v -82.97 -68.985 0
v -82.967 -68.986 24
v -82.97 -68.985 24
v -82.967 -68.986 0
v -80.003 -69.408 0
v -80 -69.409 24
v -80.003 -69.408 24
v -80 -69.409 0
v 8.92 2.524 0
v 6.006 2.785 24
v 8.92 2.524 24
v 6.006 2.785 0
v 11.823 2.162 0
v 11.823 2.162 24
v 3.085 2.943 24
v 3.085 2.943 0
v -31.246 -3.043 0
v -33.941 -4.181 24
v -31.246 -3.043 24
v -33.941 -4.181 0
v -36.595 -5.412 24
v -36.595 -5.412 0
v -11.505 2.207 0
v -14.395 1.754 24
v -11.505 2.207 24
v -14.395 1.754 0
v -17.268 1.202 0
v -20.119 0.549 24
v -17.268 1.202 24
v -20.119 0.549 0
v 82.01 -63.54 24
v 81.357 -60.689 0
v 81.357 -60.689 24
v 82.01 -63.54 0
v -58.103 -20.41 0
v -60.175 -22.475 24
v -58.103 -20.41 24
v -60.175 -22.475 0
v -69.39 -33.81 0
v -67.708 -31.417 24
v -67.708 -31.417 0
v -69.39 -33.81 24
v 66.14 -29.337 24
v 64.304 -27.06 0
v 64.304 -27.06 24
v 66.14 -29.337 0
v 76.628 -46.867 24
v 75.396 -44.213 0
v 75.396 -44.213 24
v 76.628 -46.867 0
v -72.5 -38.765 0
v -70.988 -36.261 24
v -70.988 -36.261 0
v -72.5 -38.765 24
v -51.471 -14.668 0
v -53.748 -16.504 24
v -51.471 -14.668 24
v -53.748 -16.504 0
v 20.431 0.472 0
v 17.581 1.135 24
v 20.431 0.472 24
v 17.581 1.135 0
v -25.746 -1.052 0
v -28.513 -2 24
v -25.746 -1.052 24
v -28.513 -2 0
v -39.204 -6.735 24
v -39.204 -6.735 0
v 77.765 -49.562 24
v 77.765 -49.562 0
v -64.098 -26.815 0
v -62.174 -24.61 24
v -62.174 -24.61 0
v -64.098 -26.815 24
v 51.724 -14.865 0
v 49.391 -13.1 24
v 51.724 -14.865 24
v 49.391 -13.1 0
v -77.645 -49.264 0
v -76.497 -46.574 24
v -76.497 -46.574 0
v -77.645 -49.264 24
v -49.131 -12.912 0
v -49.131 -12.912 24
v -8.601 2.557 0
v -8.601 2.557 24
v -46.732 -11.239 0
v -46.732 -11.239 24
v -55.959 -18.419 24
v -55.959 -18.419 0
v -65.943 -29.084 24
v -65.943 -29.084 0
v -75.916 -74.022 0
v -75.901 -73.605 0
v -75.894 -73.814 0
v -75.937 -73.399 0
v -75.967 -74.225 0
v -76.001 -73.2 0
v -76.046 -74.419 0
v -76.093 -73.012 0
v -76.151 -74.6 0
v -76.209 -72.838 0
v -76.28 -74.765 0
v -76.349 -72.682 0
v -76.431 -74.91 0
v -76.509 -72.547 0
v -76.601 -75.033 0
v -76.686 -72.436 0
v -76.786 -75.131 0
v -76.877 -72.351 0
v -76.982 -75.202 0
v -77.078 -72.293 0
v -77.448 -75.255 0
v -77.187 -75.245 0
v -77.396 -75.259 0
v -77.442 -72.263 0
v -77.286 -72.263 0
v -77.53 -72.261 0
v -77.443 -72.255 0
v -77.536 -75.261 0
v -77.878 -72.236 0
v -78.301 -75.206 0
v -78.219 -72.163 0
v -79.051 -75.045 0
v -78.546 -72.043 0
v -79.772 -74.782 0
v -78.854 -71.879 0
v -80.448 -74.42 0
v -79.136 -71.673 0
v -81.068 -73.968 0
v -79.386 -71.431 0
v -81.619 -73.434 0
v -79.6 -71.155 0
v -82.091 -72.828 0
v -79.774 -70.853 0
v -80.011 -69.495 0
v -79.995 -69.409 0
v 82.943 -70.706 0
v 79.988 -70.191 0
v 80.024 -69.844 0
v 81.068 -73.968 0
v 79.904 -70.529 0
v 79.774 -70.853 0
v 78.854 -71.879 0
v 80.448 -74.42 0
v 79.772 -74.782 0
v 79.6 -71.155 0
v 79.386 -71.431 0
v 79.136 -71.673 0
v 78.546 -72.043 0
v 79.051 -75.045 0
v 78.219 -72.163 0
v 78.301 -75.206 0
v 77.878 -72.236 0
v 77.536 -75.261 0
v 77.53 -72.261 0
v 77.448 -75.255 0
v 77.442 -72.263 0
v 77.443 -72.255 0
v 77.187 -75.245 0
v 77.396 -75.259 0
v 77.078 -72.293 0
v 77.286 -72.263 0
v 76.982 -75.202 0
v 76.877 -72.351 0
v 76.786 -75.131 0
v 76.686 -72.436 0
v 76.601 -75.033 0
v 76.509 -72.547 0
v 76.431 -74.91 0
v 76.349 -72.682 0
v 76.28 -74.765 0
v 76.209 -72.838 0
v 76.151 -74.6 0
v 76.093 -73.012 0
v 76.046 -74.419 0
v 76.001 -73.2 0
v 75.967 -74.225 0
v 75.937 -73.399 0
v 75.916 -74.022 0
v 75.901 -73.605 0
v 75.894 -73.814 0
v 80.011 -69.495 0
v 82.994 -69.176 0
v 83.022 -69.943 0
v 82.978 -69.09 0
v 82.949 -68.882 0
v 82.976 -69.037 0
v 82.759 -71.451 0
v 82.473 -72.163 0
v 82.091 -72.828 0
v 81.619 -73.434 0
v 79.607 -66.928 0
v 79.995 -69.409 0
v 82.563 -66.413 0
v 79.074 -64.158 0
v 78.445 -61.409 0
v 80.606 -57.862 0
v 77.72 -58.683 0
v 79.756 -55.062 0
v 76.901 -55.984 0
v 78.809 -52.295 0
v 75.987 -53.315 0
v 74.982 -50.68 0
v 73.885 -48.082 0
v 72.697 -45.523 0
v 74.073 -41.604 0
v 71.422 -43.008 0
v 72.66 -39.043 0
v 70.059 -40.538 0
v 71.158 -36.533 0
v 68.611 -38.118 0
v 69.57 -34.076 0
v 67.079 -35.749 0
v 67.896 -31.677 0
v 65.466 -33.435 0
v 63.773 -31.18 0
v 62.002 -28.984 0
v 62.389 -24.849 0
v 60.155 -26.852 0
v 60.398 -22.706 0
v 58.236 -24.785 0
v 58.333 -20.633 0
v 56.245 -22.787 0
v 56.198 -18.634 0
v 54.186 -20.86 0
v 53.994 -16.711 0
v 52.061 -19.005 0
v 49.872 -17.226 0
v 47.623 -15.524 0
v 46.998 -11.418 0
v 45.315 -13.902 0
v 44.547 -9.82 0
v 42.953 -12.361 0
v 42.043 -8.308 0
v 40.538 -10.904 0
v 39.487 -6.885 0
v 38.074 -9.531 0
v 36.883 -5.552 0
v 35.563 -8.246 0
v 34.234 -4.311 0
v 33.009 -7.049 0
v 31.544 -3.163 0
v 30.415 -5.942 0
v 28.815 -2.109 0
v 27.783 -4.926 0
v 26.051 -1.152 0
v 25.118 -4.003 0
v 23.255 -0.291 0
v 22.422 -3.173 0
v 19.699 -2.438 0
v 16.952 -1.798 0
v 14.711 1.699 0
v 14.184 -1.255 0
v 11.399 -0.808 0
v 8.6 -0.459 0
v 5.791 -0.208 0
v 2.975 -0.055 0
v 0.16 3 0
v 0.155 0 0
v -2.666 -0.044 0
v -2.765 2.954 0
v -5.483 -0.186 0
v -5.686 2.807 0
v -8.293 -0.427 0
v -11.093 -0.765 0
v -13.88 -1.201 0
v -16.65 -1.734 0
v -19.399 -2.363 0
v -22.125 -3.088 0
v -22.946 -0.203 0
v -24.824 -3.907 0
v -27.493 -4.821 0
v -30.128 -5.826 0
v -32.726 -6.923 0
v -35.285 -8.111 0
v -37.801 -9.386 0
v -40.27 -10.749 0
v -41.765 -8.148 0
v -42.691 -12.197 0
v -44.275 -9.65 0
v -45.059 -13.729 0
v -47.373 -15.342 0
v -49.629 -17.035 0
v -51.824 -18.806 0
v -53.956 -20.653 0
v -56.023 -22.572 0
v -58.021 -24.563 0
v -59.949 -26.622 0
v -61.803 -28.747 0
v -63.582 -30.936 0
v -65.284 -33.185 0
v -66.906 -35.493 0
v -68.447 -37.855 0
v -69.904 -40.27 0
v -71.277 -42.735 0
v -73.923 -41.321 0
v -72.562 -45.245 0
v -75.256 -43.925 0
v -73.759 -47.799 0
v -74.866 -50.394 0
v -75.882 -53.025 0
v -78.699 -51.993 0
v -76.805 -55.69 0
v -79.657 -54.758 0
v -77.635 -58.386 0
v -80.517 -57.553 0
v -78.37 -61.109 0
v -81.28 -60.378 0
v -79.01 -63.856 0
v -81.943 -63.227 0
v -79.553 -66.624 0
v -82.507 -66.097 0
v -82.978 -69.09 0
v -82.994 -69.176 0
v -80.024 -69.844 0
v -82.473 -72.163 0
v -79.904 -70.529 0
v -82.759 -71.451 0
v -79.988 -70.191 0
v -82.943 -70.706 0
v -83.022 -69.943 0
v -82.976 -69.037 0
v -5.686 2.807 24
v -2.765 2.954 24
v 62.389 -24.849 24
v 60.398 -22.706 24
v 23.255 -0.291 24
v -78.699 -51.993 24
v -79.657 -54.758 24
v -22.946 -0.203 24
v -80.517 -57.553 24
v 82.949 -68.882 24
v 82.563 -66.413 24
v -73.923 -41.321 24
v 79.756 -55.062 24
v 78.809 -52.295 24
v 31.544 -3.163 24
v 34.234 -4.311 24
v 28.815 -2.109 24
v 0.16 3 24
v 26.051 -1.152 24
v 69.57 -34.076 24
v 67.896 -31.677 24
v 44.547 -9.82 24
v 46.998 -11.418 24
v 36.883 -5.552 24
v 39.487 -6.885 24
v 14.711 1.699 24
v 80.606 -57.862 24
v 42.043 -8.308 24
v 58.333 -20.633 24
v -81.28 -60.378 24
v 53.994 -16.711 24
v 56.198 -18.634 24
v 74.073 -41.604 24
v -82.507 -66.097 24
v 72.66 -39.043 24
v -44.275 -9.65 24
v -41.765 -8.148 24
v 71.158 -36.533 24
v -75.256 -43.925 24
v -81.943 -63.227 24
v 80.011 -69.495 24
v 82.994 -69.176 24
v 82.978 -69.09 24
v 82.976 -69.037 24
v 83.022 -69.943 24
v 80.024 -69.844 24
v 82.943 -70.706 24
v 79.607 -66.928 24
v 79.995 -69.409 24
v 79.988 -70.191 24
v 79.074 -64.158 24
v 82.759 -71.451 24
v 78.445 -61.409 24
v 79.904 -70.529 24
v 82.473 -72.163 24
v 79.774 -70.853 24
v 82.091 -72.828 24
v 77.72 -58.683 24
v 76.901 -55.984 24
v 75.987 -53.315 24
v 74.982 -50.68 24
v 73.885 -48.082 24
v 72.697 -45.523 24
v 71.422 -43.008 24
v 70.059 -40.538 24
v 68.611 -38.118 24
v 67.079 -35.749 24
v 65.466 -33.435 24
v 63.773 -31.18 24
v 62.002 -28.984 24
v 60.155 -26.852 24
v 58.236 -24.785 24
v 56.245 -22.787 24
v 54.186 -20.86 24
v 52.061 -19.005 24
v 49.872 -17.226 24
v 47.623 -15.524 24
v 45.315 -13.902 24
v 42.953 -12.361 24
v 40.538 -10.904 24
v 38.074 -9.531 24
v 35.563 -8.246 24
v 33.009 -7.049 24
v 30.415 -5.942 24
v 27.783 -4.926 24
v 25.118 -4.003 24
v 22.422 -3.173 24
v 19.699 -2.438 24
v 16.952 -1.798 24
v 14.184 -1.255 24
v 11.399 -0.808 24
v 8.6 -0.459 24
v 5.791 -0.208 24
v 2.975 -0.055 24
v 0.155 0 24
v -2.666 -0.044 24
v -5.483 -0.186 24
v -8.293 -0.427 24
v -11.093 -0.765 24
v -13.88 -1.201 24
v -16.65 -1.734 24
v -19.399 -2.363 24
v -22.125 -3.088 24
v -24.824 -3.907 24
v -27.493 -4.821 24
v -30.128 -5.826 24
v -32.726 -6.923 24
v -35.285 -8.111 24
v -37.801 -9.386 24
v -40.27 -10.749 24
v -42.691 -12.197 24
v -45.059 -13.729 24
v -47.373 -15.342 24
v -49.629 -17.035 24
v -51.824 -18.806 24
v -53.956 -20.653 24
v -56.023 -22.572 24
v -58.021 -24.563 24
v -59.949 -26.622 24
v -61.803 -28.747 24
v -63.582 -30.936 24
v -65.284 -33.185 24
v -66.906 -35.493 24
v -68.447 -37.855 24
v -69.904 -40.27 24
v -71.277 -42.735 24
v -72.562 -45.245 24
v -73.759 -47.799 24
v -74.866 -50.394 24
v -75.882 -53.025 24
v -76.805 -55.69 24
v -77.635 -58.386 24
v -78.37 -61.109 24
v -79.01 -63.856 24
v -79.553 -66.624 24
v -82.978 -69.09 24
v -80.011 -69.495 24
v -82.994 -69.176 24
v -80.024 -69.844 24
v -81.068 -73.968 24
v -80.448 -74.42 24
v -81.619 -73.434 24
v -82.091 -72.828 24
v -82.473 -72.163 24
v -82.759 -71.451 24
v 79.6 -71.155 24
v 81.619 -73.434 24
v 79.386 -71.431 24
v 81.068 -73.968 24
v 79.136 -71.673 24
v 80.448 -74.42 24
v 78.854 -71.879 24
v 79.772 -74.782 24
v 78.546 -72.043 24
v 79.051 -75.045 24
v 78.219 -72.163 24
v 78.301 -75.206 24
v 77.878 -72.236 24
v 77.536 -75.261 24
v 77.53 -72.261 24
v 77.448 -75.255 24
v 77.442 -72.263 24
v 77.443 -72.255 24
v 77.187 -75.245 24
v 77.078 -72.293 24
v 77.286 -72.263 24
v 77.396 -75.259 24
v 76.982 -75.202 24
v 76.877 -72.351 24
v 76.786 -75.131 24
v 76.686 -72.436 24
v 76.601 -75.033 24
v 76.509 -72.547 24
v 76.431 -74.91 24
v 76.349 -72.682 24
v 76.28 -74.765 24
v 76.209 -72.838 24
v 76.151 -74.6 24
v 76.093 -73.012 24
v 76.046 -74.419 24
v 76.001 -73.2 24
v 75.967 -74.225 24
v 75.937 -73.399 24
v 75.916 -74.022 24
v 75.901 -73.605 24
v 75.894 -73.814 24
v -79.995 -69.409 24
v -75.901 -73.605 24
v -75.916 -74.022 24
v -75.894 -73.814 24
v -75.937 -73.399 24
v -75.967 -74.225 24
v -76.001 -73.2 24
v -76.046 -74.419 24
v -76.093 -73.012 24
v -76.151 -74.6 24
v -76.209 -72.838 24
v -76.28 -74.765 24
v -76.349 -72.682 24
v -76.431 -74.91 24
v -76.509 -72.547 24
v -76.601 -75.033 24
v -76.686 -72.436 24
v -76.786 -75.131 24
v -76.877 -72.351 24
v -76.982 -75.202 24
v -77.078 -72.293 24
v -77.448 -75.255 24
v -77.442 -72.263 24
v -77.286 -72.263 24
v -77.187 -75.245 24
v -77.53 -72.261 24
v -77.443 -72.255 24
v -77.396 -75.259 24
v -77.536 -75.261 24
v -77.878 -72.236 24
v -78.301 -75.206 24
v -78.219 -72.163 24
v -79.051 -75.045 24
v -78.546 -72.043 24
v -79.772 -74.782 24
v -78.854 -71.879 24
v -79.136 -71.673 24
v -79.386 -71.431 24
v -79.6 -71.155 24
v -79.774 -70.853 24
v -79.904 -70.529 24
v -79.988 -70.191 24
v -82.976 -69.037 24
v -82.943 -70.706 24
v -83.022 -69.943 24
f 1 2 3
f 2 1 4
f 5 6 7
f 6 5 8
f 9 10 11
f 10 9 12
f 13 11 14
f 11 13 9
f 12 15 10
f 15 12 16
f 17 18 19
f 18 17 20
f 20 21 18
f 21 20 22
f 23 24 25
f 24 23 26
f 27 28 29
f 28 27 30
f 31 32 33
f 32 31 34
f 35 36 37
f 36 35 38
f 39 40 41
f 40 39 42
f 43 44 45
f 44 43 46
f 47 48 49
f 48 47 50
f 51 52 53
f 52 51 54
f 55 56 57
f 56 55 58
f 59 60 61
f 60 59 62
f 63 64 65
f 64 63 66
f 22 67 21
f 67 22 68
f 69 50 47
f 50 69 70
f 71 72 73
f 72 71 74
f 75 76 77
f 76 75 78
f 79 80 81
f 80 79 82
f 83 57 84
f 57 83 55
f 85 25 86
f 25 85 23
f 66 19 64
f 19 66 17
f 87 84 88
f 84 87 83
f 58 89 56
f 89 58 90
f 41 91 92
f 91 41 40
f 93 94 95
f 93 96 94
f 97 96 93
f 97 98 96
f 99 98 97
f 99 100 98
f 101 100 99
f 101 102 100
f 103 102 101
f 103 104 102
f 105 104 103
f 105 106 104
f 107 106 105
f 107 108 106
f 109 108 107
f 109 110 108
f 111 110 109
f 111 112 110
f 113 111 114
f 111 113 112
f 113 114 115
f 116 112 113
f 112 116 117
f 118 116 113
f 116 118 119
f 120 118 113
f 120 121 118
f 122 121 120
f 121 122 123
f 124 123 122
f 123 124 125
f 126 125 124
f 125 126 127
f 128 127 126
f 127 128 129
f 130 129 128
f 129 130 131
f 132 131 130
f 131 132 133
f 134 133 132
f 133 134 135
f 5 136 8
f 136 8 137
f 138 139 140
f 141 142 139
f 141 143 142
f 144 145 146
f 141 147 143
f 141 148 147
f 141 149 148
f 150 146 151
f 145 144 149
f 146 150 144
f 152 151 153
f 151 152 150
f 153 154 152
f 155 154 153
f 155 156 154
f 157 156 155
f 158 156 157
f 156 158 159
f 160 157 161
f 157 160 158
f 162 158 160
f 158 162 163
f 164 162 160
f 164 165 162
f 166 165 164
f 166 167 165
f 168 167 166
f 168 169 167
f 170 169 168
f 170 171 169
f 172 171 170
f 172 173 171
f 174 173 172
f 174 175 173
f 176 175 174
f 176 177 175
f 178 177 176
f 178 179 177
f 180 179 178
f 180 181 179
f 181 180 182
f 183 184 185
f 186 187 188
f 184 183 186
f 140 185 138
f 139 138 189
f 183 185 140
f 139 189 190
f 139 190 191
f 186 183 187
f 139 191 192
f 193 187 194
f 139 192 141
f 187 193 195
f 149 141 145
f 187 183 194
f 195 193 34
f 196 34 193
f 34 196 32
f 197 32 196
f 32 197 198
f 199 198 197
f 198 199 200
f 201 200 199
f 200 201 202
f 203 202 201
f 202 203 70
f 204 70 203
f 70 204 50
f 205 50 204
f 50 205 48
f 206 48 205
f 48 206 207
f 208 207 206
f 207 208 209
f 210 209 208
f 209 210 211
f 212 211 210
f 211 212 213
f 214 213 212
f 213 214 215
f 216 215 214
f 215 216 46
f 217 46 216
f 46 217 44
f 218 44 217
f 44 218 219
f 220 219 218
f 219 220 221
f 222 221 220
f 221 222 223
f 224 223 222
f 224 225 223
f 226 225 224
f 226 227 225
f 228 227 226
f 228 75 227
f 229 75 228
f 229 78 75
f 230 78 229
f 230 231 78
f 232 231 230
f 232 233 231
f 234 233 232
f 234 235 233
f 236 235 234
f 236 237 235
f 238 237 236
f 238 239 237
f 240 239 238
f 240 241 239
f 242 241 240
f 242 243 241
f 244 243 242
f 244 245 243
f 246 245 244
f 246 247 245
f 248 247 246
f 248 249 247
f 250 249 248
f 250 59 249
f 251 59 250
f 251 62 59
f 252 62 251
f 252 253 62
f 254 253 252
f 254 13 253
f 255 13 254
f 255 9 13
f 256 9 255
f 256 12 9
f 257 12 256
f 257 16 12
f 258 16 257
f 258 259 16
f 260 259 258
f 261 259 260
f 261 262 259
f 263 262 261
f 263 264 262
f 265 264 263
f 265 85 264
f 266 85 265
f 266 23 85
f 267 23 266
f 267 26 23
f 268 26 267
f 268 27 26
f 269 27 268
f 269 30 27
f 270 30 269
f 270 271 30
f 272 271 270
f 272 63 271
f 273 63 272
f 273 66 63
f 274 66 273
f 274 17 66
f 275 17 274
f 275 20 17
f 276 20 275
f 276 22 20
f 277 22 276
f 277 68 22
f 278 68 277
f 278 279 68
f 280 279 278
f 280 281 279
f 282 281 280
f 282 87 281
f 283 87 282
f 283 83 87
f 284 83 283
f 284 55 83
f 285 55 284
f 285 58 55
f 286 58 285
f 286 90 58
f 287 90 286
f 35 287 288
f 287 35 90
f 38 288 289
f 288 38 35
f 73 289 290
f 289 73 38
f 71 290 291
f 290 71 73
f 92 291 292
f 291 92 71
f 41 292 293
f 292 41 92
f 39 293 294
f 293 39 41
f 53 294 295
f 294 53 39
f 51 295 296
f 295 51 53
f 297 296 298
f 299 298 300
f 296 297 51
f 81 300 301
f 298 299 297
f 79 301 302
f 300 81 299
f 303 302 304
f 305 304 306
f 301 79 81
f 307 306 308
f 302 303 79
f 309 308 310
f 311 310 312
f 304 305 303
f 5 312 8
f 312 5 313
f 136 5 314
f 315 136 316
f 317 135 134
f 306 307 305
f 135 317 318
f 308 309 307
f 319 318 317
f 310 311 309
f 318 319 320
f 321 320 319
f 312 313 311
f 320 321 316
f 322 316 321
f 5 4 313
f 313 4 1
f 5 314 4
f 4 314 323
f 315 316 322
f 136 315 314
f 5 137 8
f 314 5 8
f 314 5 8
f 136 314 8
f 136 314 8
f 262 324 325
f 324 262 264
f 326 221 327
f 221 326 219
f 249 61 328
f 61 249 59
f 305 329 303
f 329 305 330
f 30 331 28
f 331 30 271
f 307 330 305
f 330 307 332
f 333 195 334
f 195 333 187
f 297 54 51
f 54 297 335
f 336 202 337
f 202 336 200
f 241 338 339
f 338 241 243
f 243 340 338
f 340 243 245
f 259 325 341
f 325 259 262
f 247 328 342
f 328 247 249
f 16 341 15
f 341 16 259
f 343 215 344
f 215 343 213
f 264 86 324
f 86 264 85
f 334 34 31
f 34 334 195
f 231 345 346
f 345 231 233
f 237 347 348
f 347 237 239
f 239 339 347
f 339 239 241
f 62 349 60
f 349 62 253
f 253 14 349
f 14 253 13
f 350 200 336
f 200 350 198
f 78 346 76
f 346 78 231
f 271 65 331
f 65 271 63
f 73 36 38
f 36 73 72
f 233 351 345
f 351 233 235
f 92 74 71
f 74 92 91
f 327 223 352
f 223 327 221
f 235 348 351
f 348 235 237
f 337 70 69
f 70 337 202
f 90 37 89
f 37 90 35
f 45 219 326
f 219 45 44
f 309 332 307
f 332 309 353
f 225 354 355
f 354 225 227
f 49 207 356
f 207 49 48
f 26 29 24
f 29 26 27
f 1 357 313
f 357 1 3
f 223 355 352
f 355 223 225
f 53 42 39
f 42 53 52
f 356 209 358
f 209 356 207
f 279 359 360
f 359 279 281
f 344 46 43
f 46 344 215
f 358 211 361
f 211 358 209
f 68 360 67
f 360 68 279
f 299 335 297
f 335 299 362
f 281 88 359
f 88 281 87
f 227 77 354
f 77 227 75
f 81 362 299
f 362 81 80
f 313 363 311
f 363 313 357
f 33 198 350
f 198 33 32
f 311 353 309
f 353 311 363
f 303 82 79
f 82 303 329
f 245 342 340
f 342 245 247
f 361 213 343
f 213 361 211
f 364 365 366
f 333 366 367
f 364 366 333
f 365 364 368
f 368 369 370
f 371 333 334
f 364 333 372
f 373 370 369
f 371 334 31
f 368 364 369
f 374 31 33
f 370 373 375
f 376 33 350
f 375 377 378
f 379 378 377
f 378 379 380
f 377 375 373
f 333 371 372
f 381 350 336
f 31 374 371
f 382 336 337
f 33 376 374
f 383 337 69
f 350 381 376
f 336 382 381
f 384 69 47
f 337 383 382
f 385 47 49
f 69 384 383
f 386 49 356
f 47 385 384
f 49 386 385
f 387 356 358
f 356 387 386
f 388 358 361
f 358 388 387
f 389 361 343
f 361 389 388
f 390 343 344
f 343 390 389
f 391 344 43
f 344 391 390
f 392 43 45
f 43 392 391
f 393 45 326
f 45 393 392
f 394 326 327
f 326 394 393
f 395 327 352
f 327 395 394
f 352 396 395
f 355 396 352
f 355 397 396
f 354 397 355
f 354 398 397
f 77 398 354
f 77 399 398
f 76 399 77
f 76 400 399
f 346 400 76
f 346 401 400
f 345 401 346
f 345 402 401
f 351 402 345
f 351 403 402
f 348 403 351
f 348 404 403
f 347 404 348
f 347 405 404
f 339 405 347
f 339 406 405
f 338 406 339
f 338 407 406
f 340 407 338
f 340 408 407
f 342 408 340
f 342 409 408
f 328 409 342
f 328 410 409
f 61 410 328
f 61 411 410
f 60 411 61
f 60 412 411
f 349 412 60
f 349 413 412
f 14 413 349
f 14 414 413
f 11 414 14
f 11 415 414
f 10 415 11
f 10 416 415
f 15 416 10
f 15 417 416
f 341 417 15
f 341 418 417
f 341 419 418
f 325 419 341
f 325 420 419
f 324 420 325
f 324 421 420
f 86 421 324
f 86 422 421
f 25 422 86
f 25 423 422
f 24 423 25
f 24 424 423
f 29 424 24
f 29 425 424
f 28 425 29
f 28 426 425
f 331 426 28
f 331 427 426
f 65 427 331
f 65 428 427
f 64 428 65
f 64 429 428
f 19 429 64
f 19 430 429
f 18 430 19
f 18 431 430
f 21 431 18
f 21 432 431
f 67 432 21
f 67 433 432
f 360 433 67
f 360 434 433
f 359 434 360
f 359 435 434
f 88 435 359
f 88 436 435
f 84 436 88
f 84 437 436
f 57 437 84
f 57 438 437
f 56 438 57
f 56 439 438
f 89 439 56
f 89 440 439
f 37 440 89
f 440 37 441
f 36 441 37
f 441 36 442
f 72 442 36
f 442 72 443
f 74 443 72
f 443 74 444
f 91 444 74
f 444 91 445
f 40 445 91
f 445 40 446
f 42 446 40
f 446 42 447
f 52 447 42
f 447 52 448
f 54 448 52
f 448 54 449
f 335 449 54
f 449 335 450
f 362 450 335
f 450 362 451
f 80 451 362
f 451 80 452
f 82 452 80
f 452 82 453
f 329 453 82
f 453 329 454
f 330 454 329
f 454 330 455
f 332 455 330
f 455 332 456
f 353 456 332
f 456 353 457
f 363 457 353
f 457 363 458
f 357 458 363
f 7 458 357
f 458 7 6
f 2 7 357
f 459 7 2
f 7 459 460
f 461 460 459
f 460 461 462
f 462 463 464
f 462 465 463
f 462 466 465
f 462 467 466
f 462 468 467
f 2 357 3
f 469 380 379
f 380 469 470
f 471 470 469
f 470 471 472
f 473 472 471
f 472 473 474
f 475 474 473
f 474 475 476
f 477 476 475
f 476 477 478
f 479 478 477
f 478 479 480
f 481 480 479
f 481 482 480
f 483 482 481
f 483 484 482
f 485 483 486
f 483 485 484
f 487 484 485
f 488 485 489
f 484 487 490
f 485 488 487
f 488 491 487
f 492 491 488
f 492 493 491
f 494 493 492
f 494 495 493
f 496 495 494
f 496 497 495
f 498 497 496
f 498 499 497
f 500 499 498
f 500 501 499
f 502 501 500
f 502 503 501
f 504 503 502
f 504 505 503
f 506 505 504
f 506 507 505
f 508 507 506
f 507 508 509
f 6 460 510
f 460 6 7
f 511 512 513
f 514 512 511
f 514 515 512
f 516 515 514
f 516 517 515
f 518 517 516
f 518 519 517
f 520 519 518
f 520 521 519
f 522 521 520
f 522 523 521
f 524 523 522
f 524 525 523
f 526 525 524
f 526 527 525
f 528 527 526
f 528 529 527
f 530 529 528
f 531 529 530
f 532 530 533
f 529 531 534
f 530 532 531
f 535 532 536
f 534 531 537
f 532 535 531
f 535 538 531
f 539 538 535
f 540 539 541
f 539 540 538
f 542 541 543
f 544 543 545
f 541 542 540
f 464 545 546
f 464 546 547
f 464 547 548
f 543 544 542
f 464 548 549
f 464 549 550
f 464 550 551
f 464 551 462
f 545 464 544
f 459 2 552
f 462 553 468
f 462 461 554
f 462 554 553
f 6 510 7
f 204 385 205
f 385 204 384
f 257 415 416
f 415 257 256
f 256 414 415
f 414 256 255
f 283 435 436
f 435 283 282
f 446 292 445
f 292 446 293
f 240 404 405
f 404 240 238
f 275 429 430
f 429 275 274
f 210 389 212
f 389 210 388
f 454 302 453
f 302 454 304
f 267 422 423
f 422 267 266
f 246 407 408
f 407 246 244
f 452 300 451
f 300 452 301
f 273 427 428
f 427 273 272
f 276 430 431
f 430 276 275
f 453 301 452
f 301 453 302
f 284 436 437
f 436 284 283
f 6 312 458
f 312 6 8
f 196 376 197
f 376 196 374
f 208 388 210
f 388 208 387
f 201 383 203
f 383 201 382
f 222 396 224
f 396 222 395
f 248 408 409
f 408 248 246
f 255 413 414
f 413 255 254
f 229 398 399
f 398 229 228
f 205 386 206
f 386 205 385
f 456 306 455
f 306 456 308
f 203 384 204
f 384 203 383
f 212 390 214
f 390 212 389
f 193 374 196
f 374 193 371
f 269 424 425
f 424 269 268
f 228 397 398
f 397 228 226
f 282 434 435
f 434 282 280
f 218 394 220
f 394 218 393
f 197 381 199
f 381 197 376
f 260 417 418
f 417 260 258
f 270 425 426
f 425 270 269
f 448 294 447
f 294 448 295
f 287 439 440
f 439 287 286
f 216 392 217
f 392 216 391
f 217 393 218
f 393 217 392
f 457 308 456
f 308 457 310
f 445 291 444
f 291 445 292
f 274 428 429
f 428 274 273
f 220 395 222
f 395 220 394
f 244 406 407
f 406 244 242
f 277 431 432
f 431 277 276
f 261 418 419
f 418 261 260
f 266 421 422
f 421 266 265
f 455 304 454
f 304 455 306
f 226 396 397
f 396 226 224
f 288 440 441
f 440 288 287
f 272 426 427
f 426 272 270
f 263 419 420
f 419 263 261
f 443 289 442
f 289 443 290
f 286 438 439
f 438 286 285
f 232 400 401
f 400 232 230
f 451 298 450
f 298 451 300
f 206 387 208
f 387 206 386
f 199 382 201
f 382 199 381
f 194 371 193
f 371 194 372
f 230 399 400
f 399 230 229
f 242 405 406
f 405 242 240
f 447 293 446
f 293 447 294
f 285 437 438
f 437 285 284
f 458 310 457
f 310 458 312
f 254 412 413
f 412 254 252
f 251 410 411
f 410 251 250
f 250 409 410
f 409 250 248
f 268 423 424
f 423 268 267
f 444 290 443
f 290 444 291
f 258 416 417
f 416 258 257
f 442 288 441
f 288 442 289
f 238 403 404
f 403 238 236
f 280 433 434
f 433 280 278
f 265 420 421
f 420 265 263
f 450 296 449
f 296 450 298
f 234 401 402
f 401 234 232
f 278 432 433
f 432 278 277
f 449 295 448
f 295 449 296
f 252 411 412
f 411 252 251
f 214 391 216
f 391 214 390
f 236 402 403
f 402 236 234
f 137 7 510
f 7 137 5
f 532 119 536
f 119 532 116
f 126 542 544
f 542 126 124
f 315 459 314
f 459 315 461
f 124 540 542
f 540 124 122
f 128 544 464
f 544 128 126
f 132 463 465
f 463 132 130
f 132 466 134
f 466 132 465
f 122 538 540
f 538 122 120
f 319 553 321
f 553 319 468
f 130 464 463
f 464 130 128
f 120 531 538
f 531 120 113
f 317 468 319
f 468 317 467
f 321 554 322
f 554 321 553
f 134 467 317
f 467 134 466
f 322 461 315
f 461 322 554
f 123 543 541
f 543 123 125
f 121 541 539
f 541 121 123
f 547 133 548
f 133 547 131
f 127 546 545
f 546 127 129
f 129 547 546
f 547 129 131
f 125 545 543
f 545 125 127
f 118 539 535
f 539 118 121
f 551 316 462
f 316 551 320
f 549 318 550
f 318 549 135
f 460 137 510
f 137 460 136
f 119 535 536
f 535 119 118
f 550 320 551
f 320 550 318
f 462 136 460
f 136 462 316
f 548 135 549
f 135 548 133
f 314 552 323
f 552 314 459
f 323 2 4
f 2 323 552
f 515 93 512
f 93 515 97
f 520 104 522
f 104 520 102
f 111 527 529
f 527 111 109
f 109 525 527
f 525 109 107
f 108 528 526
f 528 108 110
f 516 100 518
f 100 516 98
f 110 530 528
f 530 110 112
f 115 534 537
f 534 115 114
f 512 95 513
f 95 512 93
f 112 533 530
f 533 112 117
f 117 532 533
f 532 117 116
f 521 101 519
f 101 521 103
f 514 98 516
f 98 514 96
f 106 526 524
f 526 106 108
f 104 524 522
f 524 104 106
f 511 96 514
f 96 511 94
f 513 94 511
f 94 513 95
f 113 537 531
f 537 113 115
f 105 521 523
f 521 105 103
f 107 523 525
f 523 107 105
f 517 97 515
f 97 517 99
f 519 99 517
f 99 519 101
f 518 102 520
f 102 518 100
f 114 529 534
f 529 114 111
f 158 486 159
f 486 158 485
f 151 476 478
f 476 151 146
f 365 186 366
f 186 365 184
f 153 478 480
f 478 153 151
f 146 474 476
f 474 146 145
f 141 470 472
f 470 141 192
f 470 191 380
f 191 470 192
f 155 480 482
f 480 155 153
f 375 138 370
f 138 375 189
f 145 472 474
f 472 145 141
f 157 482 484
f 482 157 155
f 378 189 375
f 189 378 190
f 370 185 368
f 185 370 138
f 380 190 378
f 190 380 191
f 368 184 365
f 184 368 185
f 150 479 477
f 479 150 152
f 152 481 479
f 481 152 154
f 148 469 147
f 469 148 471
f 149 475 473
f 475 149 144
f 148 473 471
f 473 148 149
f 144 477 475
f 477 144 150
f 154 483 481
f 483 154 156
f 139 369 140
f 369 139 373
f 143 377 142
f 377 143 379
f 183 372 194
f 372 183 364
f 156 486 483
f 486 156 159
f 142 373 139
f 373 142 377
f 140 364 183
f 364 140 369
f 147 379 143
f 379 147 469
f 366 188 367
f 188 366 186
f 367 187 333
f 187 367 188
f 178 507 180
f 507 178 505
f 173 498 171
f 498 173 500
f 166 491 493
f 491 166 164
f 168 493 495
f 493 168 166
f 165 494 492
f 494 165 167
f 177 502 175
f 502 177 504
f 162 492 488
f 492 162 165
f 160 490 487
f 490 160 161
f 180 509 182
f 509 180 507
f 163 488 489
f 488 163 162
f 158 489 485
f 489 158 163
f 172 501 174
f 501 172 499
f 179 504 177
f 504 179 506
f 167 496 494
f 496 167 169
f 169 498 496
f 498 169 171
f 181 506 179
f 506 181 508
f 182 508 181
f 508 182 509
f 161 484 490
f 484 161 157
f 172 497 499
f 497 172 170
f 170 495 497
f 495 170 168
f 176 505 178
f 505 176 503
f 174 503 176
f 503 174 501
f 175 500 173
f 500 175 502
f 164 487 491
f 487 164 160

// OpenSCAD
// Length of the stand
_length = 160.0;

// height of the stand
_height = 24.0;

// Curvature of the stand (lower values for a flatter arc, 100 for a semicircle)
_curvature = 99; //[50:100]

// Thickness of the stand
_thickness = 3;

// Radius at the ends where it clips to the device
_clip_radius = 2.5;

// How far around the device the clips run
_clip_angle = 100; //[60:180]



////////////////////////////////////////////////////////////////////////



// only works from [0 to 180] degrees, runs clockwise from 12 o'clock
module smallArc(radius0, radius1, angle, depth) {
	thickness = radius1 - radius0;
	eps = 0.1;

	union() {
		difference() {
			// full arc
			cylinder(r=radius1, h=depth, center=true);
			cylinder(r=radius0, h=depth+2*eps, center=true);

			for(z=[0, 180 - angle]) {
				rotate([0,0,z])
				translate([-radius1,0,0])			
				cube(size = [radius1*2, radius1*2, depth+eps], center=true);
			}
		}
	}
}



// arc from [0 to 360] degrees with rounded ends, runs clockwise from 12 o'clock, rounded tips not included in angle computation
module roundArc(radius0, radius1, angle, depth) {
	thickness = radius1 - radius0;
	cutAngle = 360-angle;
	centerRadius = (radius0 + radius1)/2.0;
	union() {
		if (angle > 180) {
			smallArc(radius0, radius1, 180, depth);
			rotate([0,0,-180]) {
				smallArc(radius0, radius1, angle-180, depth);
			}
		} else {
			smallArc(radius0, radius1, angle, depth);
		}

		// round ends
		for(t = [ [0,centerRadius,0], 
					 [centerRadius * -sin(cutAngle), centerRadius * cos(cutAngle),0] ]) {
			translate(t) {
				cylinder(r=thickness/2, h=depth, center=true);
			}
		}
	}
}

module makeStand(arcRadius, angle, height, outerThickness, clipRadius, clipAngle) {
	ir = arcRadius;
	or = ir + outerThickness;
	cx = (ir-clipRadius)*sin(angle/2);
	cy = (ir-clipRadius)*cos(angle/2);

	union() {

		//	spine
		rotate([0,0,angle/2]) {
			smallArc(ir, or, angle, height, $fn=180);
		}

		// clip
		for (m=[1,0]) {
			mirror([m,0,0]) {
				translate([cx, cy, 0])
				rotate([0,0,-angle/2]) {
					roundArc(clipRadius, clipRadius+outerThickness, clipAngle, height, $fn=45);
				}
			}
		}
	}
}

module make() {
	radius = _length / (2 *(_curvature/100));
	angle = 2 * asin(_length/(2*radius));

	translate([0,-radius,_height/2]) {
			makeStand(radius, 
					  angle, 
					  _height, 
					  _thickness, 
					  _clip_radius,
					  _clip_angle);
		}
}

make();
